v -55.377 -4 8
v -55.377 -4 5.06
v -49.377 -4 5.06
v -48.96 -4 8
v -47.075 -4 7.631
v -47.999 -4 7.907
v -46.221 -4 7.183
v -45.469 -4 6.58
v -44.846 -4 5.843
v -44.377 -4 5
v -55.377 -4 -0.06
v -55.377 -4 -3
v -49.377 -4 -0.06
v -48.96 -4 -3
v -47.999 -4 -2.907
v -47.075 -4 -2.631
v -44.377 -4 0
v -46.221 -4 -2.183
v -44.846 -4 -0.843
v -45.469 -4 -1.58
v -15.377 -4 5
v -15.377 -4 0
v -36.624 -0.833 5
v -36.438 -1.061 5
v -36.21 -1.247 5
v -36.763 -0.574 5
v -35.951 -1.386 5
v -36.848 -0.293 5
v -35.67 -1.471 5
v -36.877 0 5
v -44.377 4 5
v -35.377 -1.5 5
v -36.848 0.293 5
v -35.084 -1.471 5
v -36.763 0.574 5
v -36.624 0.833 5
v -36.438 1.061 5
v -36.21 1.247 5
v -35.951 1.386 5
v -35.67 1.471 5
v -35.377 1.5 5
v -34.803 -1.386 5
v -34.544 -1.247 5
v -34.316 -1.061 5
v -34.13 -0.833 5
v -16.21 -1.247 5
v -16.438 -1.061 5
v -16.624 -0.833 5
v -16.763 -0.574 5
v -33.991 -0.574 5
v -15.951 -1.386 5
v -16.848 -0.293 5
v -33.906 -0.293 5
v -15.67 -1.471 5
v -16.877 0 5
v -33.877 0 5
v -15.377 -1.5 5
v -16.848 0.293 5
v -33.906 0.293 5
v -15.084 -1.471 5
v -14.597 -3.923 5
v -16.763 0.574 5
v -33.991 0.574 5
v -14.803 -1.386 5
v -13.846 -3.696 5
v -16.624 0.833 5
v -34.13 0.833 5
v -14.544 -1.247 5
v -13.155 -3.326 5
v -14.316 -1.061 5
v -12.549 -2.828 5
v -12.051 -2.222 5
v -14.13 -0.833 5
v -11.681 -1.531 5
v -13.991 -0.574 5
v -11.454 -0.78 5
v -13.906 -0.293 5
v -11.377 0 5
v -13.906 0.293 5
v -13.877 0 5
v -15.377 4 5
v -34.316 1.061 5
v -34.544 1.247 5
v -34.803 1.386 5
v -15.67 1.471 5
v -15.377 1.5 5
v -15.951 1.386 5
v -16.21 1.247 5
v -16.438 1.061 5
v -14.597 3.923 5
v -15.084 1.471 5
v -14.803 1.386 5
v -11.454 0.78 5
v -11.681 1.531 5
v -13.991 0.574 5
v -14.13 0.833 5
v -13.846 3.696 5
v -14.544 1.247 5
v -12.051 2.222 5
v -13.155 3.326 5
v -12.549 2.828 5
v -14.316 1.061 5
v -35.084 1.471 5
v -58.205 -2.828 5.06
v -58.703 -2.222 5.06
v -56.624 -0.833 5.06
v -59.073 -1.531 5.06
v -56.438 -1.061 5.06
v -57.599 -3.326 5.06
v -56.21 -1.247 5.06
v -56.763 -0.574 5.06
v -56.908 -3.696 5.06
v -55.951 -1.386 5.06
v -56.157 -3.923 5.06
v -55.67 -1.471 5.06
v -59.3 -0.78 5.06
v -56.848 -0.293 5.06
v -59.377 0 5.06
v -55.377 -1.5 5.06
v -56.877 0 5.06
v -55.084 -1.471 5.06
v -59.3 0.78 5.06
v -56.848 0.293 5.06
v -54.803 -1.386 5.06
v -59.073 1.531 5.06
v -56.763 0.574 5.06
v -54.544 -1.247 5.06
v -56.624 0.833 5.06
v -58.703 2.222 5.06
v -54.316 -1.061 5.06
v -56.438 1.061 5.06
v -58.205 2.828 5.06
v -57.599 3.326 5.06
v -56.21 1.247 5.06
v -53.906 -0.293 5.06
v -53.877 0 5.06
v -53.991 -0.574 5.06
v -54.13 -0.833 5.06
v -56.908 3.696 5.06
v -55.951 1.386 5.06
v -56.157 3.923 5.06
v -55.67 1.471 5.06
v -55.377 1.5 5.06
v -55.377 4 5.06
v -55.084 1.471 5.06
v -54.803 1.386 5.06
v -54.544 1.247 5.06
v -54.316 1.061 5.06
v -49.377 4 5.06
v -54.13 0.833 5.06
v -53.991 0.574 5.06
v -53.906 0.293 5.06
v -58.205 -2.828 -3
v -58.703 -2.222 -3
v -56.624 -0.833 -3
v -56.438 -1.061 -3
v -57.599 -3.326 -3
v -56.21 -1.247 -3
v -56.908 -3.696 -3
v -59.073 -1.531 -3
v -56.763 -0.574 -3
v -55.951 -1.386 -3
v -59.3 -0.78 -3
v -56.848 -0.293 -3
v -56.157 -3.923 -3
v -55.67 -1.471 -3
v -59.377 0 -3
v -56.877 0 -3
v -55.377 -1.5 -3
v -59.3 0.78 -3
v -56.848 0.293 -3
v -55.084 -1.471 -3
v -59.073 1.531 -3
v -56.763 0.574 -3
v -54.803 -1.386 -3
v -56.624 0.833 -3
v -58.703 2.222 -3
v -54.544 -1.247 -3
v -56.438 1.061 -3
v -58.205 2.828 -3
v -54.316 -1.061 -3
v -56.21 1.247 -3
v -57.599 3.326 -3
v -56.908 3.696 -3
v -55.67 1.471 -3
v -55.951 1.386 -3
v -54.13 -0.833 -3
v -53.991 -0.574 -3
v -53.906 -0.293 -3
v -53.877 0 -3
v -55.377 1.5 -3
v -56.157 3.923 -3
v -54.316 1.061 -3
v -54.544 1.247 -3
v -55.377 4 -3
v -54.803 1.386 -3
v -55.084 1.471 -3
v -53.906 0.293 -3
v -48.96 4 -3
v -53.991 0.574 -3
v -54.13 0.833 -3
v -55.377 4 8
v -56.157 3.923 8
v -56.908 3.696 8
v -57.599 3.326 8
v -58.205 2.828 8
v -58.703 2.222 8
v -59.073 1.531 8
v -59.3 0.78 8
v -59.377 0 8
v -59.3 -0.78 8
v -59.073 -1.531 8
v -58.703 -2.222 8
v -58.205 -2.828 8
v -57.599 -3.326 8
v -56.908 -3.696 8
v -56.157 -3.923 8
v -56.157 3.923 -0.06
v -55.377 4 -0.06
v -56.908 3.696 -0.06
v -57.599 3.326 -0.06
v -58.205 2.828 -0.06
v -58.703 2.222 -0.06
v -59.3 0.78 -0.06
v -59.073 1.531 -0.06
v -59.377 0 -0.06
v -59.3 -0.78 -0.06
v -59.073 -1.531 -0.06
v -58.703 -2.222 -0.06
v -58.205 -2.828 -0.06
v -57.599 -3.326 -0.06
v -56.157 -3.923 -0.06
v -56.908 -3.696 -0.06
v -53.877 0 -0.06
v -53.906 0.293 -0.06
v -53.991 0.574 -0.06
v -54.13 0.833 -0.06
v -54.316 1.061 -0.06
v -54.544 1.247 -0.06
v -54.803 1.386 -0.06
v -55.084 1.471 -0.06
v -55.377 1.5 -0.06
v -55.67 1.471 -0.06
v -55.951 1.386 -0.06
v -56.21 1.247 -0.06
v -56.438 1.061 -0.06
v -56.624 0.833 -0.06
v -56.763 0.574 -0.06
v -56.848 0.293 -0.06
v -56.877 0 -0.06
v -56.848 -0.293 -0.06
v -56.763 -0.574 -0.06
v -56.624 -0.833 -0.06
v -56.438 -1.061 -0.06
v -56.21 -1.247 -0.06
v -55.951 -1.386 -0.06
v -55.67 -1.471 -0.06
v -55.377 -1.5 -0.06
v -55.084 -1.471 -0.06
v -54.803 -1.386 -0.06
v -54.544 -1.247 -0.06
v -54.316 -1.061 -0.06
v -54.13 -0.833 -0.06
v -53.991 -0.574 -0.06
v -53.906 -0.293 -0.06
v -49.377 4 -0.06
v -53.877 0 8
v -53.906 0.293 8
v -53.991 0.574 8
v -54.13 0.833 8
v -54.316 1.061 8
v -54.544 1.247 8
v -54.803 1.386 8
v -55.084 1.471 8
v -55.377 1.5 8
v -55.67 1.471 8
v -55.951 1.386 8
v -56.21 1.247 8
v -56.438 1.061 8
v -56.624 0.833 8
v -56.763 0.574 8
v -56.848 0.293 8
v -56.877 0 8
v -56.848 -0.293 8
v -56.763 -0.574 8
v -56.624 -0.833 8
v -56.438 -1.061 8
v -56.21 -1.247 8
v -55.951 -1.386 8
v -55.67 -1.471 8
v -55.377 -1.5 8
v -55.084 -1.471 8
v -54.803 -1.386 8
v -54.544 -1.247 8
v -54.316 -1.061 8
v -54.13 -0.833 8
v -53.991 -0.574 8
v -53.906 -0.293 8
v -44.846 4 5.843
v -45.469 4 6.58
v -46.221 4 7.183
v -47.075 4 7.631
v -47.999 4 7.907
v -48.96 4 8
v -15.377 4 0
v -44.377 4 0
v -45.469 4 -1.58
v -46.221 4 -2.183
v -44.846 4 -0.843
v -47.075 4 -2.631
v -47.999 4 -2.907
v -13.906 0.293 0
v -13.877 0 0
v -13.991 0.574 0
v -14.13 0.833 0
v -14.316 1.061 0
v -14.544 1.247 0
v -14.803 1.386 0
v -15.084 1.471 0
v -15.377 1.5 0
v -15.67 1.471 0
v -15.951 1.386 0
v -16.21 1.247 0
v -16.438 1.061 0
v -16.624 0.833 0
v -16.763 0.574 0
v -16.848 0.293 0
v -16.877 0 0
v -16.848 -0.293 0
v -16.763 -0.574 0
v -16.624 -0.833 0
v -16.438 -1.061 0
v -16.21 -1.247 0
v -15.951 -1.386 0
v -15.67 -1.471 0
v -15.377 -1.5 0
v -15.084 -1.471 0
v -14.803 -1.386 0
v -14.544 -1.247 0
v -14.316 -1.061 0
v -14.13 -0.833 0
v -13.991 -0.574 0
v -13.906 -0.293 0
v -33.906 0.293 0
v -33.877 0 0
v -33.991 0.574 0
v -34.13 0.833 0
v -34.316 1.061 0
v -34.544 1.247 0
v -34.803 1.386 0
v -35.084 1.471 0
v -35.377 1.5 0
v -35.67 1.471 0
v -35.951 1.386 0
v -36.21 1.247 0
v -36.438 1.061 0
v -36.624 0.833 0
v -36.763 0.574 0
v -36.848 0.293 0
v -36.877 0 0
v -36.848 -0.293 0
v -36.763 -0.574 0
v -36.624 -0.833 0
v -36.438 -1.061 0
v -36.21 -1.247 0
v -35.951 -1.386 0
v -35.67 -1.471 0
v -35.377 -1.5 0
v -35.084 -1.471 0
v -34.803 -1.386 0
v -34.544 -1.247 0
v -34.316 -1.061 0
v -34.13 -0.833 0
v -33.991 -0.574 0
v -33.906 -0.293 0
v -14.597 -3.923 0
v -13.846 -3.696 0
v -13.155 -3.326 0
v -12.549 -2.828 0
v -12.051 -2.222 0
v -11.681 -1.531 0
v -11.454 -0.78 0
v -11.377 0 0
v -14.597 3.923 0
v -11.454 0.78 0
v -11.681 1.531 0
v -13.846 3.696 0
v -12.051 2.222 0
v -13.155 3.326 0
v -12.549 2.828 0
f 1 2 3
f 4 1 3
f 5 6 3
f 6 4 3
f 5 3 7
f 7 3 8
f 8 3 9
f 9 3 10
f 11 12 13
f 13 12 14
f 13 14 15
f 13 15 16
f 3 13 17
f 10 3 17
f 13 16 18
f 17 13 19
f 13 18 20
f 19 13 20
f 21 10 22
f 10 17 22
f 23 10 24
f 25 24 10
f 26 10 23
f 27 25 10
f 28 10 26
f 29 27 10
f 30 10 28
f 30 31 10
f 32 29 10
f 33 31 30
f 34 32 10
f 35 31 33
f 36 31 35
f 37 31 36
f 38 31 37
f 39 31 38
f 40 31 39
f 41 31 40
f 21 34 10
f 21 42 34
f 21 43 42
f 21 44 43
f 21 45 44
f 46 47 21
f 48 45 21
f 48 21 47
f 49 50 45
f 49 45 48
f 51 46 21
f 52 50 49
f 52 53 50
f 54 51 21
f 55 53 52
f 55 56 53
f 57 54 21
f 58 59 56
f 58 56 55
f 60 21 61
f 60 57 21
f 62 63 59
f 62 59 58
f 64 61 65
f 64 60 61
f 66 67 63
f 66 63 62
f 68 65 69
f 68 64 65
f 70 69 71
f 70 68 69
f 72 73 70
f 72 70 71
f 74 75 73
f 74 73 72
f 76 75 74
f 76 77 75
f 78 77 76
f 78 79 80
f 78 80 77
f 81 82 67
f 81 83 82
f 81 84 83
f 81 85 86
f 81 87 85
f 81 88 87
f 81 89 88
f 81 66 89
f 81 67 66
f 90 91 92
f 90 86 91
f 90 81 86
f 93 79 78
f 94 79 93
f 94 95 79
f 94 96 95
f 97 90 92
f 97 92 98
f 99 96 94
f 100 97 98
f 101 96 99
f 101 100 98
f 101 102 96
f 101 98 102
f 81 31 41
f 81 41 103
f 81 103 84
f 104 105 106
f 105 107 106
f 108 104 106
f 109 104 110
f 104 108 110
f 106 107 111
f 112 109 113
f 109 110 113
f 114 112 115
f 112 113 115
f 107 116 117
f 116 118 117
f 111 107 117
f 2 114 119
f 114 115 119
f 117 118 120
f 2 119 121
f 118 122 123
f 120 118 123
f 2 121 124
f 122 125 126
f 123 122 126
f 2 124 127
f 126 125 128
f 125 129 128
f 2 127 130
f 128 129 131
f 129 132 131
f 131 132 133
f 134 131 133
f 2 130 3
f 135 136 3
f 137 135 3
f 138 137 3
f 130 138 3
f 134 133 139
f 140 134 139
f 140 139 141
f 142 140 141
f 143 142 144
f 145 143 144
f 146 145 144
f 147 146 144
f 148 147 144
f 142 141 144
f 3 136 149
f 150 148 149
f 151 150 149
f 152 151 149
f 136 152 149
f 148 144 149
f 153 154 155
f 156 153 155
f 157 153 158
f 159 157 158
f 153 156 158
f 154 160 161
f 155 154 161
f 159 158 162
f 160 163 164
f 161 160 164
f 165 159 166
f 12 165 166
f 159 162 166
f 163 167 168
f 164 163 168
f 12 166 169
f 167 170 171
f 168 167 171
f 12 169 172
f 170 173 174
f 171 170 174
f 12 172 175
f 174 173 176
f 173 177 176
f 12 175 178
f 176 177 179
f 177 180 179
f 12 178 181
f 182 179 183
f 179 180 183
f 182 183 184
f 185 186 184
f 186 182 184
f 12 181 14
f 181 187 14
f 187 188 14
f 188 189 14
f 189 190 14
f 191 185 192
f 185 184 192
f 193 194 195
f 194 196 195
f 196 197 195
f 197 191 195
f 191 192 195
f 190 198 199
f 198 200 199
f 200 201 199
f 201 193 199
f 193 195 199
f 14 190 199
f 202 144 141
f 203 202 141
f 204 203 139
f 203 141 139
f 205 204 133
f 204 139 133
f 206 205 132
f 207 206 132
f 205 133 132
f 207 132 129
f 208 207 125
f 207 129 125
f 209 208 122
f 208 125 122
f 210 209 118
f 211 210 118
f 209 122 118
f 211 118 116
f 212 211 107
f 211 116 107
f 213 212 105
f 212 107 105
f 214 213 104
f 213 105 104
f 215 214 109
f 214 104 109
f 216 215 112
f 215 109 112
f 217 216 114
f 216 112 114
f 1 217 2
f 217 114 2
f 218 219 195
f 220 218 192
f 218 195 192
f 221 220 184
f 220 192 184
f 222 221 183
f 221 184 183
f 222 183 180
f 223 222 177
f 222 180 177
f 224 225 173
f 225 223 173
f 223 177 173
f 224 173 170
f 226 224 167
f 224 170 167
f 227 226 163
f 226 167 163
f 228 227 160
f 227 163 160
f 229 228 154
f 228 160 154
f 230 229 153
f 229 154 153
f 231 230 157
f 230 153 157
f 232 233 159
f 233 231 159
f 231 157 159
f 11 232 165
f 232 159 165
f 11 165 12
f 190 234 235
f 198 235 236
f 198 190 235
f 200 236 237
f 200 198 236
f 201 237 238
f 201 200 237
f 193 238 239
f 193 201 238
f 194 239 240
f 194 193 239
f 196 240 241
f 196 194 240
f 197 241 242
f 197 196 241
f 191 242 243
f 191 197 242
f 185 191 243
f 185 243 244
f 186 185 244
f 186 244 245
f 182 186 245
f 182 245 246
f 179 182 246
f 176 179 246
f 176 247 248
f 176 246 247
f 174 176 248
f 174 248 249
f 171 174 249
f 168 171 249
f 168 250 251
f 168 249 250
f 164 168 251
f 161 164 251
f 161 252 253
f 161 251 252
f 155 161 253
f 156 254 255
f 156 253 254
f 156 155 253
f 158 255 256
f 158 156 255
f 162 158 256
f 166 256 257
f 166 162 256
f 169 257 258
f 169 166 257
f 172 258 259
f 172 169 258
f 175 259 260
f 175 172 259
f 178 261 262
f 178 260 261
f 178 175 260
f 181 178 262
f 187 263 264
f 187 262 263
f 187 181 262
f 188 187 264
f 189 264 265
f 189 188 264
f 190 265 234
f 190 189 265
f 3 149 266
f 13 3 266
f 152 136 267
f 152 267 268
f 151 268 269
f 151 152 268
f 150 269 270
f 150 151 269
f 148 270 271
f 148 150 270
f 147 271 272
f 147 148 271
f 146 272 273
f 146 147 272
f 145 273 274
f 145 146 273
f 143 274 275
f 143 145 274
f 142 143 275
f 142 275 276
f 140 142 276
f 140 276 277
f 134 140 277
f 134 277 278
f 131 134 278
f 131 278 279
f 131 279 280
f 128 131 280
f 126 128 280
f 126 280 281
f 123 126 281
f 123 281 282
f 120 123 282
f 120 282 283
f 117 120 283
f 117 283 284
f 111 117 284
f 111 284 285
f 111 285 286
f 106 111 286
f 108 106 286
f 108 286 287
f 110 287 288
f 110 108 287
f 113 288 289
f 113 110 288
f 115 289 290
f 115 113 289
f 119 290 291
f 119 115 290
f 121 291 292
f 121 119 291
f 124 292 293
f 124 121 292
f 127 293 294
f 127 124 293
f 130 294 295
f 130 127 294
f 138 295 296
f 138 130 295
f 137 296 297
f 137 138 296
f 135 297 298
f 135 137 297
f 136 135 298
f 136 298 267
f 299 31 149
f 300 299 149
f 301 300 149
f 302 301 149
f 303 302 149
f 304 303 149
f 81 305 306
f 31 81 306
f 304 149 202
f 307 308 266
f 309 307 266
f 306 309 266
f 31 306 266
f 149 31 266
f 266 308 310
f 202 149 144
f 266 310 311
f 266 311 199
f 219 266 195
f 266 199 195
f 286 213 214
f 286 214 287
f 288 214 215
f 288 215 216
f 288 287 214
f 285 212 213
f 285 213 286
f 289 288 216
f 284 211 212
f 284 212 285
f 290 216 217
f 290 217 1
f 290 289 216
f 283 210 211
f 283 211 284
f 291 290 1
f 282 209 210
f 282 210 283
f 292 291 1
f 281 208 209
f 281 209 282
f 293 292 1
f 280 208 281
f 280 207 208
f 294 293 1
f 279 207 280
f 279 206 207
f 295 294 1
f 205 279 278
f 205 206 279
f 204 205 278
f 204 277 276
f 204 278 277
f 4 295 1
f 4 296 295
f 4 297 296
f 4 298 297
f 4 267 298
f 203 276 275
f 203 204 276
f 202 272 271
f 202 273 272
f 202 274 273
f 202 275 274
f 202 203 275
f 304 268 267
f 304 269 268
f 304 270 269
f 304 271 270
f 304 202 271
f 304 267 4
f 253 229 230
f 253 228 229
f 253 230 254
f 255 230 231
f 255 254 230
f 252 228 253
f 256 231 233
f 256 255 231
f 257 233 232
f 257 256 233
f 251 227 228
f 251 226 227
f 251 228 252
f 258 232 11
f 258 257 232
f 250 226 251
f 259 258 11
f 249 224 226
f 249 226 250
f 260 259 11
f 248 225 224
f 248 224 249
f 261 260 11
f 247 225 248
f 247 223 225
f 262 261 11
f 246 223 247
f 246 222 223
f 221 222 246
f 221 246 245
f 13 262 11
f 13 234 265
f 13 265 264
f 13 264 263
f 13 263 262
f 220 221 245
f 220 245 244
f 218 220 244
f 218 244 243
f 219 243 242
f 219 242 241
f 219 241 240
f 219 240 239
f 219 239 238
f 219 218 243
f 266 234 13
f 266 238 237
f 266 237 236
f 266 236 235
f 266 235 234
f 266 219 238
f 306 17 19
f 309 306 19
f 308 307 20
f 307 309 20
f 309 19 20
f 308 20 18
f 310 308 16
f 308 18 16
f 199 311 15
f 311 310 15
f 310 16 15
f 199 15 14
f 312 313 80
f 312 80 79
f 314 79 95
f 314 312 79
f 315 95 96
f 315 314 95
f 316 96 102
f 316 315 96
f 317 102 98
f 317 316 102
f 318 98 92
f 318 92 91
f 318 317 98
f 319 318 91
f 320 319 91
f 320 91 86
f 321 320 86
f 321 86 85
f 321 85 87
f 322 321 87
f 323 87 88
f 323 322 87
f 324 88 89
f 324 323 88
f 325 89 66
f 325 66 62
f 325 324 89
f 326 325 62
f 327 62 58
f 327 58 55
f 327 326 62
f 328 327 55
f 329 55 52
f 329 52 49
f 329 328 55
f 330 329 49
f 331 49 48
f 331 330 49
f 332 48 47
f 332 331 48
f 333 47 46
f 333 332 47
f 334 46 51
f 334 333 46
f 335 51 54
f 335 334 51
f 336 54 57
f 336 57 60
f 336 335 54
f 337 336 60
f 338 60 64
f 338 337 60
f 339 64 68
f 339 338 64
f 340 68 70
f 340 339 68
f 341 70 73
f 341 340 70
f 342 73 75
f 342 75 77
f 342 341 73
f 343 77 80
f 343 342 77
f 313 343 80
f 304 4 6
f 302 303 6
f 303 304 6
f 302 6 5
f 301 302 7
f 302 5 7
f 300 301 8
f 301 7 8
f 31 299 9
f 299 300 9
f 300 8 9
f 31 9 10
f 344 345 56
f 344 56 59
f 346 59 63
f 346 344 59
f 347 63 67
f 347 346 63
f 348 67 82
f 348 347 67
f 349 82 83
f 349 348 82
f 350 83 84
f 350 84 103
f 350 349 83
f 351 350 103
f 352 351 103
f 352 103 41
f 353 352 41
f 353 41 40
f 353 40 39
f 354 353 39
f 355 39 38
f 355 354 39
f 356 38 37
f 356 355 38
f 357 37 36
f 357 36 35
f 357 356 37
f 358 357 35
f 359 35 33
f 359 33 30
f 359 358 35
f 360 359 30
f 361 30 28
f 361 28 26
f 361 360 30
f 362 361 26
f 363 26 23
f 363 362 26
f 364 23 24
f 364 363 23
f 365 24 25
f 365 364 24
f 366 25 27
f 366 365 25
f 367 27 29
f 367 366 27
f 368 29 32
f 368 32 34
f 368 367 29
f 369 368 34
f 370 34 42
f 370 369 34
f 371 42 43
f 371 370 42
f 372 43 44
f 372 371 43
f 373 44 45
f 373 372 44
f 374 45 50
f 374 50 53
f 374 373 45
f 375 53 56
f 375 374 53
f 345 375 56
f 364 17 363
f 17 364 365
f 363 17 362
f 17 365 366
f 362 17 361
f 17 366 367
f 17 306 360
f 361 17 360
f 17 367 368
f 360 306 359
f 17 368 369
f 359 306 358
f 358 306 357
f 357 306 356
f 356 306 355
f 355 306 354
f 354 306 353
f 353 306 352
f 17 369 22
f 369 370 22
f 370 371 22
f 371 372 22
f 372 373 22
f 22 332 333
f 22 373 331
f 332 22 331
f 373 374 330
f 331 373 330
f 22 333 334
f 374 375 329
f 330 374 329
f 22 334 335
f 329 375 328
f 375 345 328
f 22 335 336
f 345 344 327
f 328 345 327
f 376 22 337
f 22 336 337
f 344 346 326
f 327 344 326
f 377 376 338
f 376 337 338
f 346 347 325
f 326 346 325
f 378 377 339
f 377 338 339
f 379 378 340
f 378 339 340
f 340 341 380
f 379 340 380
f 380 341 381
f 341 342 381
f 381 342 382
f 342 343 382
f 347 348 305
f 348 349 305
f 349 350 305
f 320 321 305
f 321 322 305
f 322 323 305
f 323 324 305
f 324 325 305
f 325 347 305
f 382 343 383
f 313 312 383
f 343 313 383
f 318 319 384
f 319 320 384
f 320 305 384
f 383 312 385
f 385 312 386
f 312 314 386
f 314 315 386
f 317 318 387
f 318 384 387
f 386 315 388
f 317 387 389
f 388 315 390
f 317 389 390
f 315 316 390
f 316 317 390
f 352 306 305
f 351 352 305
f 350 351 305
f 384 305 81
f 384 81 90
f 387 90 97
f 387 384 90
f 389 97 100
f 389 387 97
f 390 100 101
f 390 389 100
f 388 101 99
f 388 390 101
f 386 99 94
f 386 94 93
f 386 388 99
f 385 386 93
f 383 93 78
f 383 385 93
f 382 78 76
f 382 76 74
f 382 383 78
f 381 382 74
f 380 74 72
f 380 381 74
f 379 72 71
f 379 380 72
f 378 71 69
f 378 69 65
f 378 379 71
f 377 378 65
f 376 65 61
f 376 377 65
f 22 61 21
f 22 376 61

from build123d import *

# Parameters (mm, degrees)
SKETCH1_R                = 1.5
BOSS_EXTRUDE1_DEPTH      = 5
BOSS_EXTRUDE3_START      = -5
SKETCH3_R                = 1.5
BOSS_EXTRUDE3_DEPTH      = 5
BOSS_EXTRUDE5_DEPTH      = 6
BOSS_EXTRUDE5_DEPTH_BACK = 5
BOSS_EXTRUDE5_START      = -3
SKETCH5_R                = 1.5
SKETCH6_W                = 10
SKETCH6_H                = 5.12
CUT_EXTRUDE1_DEPTH       = 10
FILLET1_R                = 5


with BuildPart() as part:
    # Sketch1 → Boss-Extrude1 (new body)
    with BuildSketch(Plane.XY):
        with BuildLine():
            Line((-35.37698341, 4), (-15.37698341, 4))
            ThreePointArc((-15.37698341, 4), (-11.37698341, 0), (-15.37698341, -4))
            Line((-15.37698341, -4), (-35.37698341, -4))
            ThreePointArc((-35.37698341, -4), (-39.37698341, 0), (-35.37698341, 4))
        make_face()
        with Locations((-35.37698341, 0)):
            Circle(SKETCH1_R, mode=Mode.SUBTRACT)
        with Locations((-15.37698341, 0)):
            Circle(SKETCH1_R, mode=Mode.SUBTRACT)
    extrude(amount=BOSS_EXTRUDE1_DEPTH)

    # Sketch3 → Boss-Extrude3 (add)
    with BuildSketch(Plane.XY.offset(5).offset(BOSS_EXTRUDE3_START)):
        with BuildLine():
            Line((-55.37698341, -4), (-35.37698341, -4))
            ThreePointArc((-35.37698341, -4), (-39.37698341, 0), (-35.37698341, 4))
            Line((-35.37698341, 4), (-55.37698341, 4))
            ThreePointArc((-55.37698341, 4), (-59.37698341, 0), (-55.37698341, -4))
        make_face()
        with Locations((-55.37698341, 0)):
            Circle(SKETCH3_R, mode=Mode.SUBTRACT)
    extrude(amount=BOSS_EXTRUDE3_DEPTH)

    # Sketch5 → Boss-Extrude5 (add, two sides: drawn at the far end of the back side and taken through both)
    with BuildSketch(Plane.XY.offset(5).offset(BOSS_EXTRUDE5_START - BOSS_EXTRUDE5_DEPTH_BACK)):
        with BuildLine():
            Line((-44.37698341, -4), (-44.37698341, 4))
            Line((-44.37698341, 4), (-55.37698341, 4))
            ThreePointArc((-55.37698341, 4), (-59.37698341, 0), (-55.37698341, -4))
            Line((-55.37698341, -4), (-44.37698341, -4))
        make_face()
        with Locations((-55.37698341, 0)):
            Circle(SKETCH5_R, mode=Mode.SUBTRACT)
    extrude(amount=BOSS_EXTRUDE5_DEPTH + BOSS_EXTRUDE5_DEPTH_BACK)

    # Sketch6 → Cut-Extrude1 (cut)
    with BuildSketch(Plane(origin=(0, 4, 0), x_dir=(1, 0, 0), z_dir=(0, 1, 0))):
        with Locations((-54.37698341, -2.5)):
            Rectangle(SKETCH6_W, SKETCH6_H)
    extrude(amount=-CUT_EXTRUDE1_DEPTH, mode=Mode.SUBTRACT)

    # Fillet1
    # the kernel refuses this fillet: 5 mm, written as the material it takes off along each edge
    with BuildSketch(Plane(origin=(-44.37698341, -15.456439237, -3), x_dir=(0, 0, 1), z_dir=(0, 1, 0))) as fillet1_piece_1:
        with BuildLine():
            CenterArc((5, -4.582575695), FILLET1_R, 113.578178478, 66.421821522)
            Line((0, -4.582575695), (-0.1, -4.582575695))
            Line((-0.1, -4.582575695), (-0.1, 0))
            Line((-0.1, 0), (0, 0.1))
            ThreePointArc((0, 0.1), (1.5, 0.1), (2.96, 0.091651514))
            Line((2.96, 0.091651514), (3, 0))
        make_face()
    extrude(amount=30.912878475, mode=Mode.SUBTRACT)
    with BuildSketch(Plane(origin=(-44.37698341, -15.456439237, 8), x_dir=(-1, 0, 0), z_dir=(0, 1, 0))) as fillet1_piece_2:
        with BuildLine():
            CenterArc((4.582575695, -5), FILLET1_R, 90, 66.421821522)
            Line((0, -3), (-0.091651514, -2.96))
            ThreePointArc((-0.091651514, -2.96), (-0.1, -1.5), (-0.1, 0))
            Line((-0.1, 0), (0, 0.1))
            Line((0, 0.1), (4.582575695, 0.1))
            Line((4.582575695, 0.1), (4.582575695, 0))
        make_face()
    extrude(amount=30.912878475, mode=Mode.SUBTRACT)


solid = part.part
